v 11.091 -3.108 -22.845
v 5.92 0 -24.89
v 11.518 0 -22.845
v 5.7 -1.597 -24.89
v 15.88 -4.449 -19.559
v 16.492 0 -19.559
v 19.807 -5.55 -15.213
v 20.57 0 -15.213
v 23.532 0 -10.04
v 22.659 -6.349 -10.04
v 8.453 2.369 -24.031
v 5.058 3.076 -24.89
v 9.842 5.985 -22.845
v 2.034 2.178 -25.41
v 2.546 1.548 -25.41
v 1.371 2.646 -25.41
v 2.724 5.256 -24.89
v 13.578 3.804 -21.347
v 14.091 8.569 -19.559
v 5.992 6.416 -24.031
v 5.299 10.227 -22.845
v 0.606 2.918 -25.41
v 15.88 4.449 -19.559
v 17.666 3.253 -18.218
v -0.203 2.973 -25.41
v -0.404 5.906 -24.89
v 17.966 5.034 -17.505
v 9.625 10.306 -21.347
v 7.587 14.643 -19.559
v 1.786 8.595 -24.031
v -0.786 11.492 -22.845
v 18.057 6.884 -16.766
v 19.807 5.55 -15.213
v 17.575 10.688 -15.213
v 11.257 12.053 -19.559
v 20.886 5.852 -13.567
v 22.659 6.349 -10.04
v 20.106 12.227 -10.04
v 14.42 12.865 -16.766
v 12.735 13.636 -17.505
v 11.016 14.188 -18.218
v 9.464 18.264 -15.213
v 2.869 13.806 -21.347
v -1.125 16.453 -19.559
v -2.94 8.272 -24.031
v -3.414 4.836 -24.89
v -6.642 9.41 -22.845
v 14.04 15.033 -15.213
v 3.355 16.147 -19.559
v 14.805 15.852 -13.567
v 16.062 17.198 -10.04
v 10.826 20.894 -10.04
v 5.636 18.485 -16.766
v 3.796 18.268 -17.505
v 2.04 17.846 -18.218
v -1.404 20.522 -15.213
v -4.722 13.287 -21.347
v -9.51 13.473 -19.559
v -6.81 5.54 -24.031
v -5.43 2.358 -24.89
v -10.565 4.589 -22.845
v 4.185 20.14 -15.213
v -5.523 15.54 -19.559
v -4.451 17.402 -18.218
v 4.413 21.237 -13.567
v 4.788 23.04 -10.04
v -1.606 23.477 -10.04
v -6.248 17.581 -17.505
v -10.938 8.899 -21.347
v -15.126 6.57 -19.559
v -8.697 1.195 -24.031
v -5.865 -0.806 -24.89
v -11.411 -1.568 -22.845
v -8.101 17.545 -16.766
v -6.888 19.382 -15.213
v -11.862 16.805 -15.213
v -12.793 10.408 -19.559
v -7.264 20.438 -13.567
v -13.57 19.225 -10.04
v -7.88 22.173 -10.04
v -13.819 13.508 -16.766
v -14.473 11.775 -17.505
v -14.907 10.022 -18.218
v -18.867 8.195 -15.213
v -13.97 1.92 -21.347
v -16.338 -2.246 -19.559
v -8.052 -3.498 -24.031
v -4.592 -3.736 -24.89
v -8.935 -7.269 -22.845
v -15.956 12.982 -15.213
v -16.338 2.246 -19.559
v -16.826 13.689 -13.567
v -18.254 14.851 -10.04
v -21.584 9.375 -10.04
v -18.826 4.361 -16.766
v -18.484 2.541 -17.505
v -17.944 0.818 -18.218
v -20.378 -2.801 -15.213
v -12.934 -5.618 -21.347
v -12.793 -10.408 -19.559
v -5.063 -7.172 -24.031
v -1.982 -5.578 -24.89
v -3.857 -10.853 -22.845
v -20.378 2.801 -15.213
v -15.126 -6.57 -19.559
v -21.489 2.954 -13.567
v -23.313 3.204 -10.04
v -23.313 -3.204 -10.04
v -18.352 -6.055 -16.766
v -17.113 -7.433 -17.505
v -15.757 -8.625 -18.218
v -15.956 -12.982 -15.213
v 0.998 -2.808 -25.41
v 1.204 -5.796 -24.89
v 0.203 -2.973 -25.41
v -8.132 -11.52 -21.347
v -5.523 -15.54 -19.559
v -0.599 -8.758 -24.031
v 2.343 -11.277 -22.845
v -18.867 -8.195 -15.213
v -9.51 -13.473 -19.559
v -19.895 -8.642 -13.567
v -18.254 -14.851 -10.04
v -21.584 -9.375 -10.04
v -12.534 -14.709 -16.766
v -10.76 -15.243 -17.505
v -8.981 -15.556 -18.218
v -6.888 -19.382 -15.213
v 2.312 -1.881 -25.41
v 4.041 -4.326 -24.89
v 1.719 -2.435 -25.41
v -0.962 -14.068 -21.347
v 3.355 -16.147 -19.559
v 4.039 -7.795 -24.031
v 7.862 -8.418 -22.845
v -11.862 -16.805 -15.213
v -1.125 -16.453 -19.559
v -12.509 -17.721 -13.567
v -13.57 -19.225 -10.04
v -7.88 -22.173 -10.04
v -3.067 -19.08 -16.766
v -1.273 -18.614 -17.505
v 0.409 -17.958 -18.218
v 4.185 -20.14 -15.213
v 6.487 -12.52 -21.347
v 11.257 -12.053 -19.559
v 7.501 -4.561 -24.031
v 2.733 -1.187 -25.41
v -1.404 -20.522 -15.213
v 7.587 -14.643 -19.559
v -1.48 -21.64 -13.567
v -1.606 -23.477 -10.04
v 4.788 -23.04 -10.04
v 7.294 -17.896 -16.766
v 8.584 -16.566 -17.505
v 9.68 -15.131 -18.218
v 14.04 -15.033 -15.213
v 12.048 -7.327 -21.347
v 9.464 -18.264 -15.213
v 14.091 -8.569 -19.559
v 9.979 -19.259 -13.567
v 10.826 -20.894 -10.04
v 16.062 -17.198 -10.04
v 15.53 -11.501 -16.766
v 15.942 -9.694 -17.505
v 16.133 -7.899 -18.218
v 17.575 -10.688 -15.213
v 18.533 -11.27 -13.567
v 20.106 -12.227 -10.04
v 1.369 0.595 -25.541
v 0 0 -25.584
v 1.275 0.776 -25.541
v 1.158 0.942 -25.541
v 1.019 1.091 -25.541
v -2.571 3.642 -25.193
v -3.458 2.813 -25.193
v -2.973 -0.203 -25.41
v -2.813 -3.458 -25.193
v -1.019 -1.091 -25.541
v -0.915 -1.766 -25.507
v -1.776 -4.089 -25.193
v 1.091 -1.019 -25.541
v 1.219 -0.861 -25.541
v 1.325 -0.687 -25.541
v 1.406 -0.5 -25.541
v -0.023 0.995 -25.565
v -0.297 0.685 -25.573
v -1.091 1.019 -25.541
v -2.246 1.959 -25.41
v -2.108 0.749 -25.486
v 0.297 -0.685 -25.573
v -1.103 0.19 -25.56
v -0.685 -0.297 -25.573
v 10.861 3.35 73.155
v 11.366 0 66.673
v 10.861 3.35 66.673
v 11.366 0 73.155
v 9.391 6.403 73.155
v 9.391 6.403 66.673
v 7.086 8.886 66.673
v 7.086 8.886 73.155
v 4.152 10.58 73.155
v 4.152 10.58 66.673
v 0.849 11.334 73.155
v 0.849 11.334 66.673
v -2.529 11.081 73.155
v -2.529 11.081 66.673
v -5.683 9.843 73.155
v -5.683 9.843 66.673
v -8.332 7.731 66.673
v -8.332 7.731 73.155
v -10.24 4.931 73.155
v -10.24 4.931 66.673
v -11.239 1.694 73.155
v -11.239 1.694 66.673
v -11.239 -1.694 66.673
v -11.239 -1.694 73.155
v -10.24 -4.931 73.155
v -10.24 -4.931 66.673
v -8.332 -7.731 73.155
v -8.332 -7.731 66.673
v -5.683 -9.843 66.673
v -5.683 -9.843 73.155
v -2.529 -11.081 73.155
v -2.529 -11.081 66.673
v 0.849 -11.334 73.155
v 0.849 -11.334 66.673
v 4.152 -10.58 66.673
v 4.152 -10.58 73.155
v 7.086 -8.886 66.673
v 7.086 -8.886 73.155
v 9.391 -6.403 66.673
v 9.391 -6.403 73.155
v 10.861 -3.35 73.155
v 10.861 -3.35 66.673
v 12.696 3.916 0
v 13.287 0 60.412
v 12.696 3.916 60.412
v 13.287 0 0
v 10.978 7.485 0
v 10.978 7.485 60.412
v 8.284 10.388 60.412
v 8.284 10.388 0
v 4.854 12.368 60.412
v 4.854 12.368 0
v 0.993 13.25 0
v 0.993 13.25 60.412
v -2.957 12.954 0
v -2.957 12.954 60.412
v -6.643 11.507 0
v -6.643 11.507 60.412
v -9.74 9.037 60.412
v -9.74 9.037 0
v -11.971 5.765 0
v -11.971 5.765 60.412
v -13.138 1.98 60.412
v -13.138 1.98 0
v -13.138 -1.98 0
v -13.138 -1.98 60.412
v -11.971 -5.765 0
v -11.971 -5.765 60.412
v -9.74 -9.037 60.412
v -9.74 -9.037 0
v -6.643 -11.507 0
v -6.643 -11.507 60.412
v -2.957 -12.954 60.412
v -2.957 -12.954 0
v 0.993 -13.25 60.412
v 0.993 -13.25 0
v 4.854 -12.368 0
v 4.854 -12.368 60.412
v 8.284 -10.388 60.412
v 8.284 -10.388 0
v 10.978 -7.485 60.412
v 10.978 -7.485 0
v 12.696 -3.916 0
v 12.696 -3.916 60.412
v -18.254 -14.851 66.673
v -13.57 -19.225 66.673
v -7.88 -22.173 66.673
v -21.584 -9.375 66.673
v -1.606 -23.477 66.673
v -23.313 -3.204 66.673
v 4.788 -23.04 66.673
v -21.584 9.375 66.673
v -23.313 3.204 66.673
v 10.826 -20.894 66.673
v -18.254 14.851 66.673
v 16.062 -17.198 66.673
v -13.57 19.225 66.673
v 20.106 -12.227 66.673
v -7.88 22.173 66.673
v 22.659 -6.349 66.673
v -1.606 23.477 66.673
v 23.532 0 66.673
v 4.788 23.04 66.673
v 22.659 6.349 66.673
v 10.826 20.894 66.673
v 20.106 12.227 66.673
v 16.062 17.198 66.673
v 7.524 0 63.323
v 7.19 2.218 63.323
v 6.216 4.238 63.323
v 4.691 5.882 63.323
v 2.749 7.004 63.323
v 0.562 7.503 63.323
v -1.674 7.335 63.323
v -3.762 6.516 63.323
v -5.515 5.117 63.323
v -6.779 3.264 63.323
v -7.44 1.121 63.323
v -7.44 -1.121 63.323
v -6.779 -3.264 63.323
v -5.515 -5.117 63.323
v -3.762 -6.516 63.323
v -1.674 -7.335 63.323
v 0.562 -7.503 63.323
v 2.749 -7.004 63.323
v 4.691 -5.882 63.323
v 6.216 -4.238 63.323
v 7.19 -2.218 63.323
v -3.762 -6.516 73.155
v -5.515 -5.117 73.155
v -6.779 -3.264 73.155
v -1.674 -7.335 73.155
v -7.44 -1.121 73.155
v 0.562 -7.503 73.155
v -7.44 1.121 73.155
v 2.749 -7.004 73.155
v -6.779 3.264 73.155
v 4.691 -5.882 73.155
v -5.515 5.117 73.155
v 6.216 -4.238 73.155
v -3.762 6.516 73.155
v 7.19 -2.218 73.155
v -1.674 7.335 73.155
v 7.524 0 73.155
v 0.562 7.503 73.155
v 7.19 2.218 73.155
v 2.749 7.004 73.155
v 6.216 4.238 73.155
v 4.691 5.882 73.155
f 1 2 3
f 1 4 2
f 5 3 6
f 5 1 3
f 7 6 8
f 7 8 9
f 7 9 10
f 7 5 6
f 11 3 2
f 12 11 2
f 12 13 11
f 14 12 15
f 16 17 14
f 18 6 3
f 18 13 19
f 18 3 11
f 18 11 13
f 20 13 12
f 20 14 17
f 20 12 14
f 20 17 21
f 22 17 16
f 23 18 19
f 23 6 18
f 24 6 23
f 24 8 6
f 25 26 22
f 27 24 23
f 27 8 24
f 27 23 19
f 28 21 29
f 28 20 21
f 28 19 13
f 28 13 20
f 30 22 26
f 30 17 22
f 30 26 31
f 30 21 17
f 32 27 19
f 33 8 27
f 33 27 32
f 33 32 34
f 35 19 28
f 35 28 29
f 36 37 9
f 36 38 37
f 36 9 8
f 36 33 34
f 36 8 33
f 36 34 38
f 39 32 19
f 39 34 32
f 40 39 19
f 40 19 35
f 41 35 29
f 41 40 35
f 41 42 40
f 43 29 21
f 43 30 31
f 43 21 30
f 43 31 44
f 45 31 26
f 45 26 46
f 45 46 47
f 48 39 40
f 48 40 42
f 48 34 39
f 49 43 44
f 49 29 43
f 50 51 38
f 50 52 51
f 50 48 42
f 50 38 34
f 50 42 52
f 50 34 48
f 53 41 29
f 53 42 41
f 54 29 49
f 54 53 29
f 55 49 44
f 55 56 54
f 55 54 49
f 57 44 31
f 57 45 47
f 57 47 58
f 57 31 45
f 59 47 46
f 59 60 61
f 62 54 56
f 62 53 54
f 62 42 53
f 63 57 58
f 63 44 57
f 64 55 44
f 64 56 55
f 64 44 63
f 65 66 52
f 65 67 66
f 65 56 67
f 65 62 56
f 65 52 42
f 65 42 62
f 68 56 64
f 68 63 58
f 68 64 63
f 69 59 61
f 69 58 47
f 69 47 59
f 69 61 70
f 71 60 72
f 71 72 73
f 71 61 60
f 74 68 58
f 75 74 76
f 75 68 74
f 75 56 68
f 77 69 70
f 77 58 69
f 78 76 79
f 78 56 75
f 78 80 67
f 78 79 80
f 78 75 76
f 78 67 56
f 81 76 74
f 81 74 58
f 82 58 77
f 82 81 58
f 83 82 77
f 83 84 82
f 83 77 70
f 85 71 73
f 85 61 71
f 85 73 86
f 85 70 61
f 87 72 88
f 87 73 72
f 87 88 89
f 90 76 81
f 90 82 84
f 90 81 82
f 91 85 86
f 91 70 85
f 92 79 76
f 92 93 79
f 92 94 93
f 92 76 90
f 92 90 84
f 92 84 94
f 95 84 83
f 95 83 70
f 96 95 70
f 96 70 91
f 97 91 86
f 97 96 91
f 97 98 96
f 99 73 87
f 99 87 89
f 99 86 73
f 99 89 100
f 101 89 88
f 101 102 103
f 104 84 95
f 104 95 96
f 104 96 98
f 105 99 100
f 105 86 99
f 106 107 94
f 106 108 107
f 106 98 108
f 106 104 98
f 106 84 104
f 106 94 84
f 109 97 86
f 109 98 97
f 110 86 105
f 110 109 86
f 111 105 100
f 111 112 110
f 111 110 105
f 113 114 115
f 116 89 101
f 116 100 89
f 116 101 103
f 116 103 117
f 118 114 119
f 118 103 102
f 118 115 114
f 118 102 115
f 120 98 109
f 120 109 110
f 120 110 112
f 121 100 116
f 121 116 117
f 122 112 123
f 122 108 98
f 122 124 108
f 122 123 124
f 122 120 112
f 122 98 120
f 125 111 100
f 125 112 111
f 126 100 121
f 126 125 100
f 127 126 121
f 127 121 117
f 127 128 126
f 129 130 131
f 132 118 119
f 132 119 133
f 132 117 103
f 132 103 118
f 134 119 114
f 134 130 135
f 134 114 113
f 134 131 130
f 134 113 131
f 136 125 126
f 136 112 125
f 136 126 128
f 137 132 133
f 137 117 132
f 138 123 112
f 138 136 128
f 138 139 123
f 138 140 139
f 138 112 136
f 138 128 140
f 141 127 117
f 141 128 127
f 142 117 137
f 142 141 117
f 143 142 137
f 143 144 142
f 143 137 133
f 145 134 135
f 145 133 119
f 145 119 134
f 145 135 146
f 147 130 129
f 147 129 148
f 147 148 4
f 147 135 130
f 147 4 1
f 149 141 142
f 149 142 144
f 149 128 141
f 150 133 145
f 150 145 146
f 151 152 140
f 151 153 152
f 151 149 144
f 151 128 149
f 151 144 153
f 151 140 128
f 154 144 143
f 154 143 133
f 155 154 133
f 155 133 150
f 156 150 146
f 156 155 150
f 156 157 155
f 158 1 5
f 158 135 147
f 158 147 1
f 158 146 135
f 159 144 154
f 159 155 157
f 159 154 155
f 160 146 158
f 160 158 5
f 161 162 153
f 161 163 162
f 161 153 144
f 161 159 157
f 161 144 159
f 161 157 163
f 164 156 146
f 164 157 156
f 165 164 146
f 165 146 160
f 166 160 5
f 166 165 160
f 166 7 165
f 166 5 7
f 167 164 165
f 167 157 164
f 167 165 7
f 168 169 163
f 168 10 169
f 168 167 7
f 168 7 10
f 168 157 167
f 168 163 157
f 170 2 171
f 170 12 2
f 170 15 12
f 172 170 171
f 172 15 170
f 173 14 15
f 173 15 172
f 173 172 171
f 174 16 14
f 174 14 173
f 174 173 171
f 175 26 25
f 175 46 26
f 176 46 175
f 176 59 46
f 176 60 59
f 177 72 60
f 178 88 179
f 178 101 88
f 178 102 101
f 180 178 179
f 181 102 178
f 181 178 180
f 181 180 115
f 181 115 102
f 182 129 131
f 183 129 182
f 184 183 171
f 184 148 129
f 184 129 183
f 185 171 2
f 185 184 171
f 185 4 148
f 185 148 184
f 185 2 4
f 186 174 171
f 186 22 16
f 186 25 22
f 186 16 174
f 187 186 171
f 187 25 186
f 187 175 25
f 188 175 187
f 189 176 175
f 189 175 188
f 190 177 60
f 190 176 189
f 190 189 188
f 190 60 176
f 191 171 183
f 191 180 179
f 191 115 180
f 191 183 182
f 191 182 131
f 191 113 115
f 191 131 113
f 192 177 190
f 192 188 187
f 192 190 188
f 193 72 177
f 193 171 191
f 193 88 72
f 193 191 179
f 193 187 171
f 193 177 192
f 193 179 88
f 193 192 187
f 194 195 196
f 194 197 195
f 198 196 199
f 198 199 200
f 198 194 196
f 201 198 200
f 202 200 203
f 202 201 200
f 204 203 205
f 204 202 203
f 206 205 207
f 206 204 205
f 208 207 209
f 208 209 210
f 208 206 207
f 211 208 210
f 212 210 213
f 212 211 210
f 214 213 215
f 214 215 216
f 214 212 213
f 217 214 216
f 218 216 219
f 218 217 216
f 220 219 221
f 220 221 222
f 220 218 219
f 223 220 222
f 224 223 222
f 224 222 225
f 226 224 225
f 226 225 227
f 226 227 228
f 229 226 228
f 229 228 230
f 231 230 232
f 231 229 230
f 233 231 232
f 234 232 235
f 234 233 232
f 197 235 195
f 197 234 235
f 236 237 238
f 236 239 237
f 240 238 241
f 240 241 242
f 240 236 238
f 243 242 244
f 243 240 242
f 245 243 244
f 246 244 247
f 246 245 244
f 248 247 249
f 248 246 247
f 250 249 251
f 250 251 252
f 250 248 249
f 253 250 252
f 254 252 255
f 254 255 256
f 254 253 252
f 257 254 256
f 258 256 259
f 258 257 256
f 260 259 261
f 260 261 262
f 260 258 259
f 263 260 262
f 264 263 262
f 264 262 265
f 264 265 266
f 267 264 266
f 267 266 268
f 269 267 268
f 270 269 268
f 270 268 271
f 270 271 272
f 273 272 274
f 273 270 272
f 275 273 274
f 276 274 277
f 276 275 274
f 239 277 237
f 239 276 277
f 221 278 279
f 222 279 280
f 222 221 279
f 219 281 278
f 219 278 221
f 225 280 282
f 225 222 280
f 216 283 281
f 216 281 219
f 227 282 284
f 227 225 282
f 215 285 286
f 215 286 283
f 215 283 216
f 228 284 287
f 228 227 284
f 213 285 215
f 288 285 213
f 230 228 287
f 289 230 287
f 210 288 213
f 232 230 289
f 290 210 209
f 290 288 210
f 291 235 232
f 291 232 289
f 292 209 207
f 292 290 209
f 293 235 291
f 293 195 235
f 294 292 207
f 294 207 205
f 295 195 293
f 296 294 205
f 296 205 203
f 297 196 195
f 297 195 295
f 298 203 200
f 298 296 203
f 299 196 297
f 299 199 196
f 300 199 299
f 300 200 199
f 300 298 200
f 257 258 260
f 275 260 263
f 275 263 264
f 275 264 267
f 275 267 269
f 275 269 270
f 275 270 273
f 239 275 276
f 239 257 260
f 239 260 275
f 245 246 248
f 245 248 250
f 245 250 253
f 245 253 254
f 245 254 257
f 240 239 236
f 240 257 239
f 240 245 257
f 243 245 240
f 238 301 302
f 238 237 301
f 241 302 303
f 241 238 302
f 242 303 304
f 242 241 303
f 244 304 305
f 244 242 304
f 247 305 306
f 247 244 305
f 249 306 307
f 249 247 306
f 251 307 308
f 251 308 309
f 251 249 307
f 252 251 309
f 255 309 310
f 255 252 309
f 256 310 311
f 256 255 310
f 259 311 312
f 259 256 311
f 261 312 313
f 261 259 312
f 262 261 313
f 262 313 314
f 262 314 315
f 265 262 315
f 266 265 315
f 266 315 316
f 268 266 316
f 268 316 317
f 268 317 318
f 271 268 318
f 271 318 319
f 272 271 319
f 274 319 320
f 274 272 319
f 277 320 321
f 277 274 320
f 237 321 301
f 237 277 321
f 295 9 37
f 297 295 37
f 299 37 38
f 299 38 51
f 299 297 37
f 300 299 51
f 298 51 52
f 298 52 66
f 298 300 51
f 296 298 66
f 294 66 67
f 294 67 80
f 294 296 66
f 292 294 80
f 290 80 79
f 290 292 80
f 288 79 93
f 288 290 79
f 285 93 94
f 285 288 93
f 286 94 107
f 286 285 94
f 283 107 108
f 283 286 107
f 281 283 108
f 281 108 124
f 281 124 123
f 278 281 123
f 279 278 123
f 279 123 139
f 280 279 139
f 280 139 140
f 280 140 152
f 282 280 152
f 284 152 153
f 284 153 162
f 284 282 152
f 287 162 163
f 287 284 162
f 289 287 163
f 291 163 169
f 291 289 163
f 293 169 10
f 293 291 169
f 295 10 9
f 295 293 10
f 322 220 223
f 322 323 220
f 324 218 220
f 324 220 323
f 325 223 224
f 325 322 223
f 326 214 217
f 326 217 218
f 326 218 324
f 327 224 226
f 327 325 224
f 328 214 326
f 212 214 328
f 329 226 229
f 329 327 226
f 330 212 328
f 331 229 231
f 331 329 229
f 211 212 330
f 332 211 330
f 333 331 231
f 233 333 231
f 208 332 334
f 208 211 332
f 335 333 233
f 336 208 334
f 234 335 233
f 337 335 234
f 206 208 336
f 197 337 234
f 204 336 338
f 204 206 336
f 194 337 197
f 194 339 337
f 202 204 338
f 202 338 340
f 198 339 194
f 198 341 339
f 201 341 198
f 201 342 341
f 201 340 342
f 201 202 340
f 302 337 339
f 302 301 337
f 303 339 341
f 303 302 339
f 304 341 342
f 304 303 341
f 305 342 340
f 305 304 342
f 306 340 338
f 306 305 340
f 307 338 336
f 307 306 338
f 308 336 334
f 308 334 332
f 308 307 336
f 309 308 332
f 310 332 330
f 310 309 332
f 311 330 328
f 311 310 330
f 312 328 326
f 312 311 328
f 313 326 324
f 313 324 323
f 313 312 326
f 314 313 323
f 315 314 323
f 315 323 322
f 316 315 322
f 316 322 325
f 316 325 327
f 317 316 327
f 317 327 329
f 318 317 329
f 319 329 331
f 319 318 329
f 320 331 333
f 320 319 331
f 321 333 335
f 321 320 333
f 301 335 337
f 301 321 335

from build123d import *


with BuildPart() as f1:
    # F0 (on Front) → F1 (revolve)
    with BuildSketch(Plane.XZ):
        with BuildLine():
            Line((13.286673, 0), (0, 0))
            Line((0, 0), (0, -25.584204))
            ThreePointArc((0, -25.584204), (14.101099, -21.347377), (23.531822, -10.04016))
            Line((23.531822, -10.04016), (23.531822, 66.672839))
            Line((23.531822, 66.672839), (11.365706, 66.672839))
            Line((11.365706, 66.672839), (11.365706, 73.155217))
            Line((11.365706, 73.155217), (7.523784, 73.155217))
            Line((7.523784, 73.155217), (7.523784, 63.322656))
            Line((7.523784, 63.322656), (13.286673, 60.411584))
            Line((13.286673, 60.411584), (13.286673, 0))
        make_face()
    revolve(axis=Axis((0, 0, -12.792102), (0, 0, 1)))


solid = f1.part
